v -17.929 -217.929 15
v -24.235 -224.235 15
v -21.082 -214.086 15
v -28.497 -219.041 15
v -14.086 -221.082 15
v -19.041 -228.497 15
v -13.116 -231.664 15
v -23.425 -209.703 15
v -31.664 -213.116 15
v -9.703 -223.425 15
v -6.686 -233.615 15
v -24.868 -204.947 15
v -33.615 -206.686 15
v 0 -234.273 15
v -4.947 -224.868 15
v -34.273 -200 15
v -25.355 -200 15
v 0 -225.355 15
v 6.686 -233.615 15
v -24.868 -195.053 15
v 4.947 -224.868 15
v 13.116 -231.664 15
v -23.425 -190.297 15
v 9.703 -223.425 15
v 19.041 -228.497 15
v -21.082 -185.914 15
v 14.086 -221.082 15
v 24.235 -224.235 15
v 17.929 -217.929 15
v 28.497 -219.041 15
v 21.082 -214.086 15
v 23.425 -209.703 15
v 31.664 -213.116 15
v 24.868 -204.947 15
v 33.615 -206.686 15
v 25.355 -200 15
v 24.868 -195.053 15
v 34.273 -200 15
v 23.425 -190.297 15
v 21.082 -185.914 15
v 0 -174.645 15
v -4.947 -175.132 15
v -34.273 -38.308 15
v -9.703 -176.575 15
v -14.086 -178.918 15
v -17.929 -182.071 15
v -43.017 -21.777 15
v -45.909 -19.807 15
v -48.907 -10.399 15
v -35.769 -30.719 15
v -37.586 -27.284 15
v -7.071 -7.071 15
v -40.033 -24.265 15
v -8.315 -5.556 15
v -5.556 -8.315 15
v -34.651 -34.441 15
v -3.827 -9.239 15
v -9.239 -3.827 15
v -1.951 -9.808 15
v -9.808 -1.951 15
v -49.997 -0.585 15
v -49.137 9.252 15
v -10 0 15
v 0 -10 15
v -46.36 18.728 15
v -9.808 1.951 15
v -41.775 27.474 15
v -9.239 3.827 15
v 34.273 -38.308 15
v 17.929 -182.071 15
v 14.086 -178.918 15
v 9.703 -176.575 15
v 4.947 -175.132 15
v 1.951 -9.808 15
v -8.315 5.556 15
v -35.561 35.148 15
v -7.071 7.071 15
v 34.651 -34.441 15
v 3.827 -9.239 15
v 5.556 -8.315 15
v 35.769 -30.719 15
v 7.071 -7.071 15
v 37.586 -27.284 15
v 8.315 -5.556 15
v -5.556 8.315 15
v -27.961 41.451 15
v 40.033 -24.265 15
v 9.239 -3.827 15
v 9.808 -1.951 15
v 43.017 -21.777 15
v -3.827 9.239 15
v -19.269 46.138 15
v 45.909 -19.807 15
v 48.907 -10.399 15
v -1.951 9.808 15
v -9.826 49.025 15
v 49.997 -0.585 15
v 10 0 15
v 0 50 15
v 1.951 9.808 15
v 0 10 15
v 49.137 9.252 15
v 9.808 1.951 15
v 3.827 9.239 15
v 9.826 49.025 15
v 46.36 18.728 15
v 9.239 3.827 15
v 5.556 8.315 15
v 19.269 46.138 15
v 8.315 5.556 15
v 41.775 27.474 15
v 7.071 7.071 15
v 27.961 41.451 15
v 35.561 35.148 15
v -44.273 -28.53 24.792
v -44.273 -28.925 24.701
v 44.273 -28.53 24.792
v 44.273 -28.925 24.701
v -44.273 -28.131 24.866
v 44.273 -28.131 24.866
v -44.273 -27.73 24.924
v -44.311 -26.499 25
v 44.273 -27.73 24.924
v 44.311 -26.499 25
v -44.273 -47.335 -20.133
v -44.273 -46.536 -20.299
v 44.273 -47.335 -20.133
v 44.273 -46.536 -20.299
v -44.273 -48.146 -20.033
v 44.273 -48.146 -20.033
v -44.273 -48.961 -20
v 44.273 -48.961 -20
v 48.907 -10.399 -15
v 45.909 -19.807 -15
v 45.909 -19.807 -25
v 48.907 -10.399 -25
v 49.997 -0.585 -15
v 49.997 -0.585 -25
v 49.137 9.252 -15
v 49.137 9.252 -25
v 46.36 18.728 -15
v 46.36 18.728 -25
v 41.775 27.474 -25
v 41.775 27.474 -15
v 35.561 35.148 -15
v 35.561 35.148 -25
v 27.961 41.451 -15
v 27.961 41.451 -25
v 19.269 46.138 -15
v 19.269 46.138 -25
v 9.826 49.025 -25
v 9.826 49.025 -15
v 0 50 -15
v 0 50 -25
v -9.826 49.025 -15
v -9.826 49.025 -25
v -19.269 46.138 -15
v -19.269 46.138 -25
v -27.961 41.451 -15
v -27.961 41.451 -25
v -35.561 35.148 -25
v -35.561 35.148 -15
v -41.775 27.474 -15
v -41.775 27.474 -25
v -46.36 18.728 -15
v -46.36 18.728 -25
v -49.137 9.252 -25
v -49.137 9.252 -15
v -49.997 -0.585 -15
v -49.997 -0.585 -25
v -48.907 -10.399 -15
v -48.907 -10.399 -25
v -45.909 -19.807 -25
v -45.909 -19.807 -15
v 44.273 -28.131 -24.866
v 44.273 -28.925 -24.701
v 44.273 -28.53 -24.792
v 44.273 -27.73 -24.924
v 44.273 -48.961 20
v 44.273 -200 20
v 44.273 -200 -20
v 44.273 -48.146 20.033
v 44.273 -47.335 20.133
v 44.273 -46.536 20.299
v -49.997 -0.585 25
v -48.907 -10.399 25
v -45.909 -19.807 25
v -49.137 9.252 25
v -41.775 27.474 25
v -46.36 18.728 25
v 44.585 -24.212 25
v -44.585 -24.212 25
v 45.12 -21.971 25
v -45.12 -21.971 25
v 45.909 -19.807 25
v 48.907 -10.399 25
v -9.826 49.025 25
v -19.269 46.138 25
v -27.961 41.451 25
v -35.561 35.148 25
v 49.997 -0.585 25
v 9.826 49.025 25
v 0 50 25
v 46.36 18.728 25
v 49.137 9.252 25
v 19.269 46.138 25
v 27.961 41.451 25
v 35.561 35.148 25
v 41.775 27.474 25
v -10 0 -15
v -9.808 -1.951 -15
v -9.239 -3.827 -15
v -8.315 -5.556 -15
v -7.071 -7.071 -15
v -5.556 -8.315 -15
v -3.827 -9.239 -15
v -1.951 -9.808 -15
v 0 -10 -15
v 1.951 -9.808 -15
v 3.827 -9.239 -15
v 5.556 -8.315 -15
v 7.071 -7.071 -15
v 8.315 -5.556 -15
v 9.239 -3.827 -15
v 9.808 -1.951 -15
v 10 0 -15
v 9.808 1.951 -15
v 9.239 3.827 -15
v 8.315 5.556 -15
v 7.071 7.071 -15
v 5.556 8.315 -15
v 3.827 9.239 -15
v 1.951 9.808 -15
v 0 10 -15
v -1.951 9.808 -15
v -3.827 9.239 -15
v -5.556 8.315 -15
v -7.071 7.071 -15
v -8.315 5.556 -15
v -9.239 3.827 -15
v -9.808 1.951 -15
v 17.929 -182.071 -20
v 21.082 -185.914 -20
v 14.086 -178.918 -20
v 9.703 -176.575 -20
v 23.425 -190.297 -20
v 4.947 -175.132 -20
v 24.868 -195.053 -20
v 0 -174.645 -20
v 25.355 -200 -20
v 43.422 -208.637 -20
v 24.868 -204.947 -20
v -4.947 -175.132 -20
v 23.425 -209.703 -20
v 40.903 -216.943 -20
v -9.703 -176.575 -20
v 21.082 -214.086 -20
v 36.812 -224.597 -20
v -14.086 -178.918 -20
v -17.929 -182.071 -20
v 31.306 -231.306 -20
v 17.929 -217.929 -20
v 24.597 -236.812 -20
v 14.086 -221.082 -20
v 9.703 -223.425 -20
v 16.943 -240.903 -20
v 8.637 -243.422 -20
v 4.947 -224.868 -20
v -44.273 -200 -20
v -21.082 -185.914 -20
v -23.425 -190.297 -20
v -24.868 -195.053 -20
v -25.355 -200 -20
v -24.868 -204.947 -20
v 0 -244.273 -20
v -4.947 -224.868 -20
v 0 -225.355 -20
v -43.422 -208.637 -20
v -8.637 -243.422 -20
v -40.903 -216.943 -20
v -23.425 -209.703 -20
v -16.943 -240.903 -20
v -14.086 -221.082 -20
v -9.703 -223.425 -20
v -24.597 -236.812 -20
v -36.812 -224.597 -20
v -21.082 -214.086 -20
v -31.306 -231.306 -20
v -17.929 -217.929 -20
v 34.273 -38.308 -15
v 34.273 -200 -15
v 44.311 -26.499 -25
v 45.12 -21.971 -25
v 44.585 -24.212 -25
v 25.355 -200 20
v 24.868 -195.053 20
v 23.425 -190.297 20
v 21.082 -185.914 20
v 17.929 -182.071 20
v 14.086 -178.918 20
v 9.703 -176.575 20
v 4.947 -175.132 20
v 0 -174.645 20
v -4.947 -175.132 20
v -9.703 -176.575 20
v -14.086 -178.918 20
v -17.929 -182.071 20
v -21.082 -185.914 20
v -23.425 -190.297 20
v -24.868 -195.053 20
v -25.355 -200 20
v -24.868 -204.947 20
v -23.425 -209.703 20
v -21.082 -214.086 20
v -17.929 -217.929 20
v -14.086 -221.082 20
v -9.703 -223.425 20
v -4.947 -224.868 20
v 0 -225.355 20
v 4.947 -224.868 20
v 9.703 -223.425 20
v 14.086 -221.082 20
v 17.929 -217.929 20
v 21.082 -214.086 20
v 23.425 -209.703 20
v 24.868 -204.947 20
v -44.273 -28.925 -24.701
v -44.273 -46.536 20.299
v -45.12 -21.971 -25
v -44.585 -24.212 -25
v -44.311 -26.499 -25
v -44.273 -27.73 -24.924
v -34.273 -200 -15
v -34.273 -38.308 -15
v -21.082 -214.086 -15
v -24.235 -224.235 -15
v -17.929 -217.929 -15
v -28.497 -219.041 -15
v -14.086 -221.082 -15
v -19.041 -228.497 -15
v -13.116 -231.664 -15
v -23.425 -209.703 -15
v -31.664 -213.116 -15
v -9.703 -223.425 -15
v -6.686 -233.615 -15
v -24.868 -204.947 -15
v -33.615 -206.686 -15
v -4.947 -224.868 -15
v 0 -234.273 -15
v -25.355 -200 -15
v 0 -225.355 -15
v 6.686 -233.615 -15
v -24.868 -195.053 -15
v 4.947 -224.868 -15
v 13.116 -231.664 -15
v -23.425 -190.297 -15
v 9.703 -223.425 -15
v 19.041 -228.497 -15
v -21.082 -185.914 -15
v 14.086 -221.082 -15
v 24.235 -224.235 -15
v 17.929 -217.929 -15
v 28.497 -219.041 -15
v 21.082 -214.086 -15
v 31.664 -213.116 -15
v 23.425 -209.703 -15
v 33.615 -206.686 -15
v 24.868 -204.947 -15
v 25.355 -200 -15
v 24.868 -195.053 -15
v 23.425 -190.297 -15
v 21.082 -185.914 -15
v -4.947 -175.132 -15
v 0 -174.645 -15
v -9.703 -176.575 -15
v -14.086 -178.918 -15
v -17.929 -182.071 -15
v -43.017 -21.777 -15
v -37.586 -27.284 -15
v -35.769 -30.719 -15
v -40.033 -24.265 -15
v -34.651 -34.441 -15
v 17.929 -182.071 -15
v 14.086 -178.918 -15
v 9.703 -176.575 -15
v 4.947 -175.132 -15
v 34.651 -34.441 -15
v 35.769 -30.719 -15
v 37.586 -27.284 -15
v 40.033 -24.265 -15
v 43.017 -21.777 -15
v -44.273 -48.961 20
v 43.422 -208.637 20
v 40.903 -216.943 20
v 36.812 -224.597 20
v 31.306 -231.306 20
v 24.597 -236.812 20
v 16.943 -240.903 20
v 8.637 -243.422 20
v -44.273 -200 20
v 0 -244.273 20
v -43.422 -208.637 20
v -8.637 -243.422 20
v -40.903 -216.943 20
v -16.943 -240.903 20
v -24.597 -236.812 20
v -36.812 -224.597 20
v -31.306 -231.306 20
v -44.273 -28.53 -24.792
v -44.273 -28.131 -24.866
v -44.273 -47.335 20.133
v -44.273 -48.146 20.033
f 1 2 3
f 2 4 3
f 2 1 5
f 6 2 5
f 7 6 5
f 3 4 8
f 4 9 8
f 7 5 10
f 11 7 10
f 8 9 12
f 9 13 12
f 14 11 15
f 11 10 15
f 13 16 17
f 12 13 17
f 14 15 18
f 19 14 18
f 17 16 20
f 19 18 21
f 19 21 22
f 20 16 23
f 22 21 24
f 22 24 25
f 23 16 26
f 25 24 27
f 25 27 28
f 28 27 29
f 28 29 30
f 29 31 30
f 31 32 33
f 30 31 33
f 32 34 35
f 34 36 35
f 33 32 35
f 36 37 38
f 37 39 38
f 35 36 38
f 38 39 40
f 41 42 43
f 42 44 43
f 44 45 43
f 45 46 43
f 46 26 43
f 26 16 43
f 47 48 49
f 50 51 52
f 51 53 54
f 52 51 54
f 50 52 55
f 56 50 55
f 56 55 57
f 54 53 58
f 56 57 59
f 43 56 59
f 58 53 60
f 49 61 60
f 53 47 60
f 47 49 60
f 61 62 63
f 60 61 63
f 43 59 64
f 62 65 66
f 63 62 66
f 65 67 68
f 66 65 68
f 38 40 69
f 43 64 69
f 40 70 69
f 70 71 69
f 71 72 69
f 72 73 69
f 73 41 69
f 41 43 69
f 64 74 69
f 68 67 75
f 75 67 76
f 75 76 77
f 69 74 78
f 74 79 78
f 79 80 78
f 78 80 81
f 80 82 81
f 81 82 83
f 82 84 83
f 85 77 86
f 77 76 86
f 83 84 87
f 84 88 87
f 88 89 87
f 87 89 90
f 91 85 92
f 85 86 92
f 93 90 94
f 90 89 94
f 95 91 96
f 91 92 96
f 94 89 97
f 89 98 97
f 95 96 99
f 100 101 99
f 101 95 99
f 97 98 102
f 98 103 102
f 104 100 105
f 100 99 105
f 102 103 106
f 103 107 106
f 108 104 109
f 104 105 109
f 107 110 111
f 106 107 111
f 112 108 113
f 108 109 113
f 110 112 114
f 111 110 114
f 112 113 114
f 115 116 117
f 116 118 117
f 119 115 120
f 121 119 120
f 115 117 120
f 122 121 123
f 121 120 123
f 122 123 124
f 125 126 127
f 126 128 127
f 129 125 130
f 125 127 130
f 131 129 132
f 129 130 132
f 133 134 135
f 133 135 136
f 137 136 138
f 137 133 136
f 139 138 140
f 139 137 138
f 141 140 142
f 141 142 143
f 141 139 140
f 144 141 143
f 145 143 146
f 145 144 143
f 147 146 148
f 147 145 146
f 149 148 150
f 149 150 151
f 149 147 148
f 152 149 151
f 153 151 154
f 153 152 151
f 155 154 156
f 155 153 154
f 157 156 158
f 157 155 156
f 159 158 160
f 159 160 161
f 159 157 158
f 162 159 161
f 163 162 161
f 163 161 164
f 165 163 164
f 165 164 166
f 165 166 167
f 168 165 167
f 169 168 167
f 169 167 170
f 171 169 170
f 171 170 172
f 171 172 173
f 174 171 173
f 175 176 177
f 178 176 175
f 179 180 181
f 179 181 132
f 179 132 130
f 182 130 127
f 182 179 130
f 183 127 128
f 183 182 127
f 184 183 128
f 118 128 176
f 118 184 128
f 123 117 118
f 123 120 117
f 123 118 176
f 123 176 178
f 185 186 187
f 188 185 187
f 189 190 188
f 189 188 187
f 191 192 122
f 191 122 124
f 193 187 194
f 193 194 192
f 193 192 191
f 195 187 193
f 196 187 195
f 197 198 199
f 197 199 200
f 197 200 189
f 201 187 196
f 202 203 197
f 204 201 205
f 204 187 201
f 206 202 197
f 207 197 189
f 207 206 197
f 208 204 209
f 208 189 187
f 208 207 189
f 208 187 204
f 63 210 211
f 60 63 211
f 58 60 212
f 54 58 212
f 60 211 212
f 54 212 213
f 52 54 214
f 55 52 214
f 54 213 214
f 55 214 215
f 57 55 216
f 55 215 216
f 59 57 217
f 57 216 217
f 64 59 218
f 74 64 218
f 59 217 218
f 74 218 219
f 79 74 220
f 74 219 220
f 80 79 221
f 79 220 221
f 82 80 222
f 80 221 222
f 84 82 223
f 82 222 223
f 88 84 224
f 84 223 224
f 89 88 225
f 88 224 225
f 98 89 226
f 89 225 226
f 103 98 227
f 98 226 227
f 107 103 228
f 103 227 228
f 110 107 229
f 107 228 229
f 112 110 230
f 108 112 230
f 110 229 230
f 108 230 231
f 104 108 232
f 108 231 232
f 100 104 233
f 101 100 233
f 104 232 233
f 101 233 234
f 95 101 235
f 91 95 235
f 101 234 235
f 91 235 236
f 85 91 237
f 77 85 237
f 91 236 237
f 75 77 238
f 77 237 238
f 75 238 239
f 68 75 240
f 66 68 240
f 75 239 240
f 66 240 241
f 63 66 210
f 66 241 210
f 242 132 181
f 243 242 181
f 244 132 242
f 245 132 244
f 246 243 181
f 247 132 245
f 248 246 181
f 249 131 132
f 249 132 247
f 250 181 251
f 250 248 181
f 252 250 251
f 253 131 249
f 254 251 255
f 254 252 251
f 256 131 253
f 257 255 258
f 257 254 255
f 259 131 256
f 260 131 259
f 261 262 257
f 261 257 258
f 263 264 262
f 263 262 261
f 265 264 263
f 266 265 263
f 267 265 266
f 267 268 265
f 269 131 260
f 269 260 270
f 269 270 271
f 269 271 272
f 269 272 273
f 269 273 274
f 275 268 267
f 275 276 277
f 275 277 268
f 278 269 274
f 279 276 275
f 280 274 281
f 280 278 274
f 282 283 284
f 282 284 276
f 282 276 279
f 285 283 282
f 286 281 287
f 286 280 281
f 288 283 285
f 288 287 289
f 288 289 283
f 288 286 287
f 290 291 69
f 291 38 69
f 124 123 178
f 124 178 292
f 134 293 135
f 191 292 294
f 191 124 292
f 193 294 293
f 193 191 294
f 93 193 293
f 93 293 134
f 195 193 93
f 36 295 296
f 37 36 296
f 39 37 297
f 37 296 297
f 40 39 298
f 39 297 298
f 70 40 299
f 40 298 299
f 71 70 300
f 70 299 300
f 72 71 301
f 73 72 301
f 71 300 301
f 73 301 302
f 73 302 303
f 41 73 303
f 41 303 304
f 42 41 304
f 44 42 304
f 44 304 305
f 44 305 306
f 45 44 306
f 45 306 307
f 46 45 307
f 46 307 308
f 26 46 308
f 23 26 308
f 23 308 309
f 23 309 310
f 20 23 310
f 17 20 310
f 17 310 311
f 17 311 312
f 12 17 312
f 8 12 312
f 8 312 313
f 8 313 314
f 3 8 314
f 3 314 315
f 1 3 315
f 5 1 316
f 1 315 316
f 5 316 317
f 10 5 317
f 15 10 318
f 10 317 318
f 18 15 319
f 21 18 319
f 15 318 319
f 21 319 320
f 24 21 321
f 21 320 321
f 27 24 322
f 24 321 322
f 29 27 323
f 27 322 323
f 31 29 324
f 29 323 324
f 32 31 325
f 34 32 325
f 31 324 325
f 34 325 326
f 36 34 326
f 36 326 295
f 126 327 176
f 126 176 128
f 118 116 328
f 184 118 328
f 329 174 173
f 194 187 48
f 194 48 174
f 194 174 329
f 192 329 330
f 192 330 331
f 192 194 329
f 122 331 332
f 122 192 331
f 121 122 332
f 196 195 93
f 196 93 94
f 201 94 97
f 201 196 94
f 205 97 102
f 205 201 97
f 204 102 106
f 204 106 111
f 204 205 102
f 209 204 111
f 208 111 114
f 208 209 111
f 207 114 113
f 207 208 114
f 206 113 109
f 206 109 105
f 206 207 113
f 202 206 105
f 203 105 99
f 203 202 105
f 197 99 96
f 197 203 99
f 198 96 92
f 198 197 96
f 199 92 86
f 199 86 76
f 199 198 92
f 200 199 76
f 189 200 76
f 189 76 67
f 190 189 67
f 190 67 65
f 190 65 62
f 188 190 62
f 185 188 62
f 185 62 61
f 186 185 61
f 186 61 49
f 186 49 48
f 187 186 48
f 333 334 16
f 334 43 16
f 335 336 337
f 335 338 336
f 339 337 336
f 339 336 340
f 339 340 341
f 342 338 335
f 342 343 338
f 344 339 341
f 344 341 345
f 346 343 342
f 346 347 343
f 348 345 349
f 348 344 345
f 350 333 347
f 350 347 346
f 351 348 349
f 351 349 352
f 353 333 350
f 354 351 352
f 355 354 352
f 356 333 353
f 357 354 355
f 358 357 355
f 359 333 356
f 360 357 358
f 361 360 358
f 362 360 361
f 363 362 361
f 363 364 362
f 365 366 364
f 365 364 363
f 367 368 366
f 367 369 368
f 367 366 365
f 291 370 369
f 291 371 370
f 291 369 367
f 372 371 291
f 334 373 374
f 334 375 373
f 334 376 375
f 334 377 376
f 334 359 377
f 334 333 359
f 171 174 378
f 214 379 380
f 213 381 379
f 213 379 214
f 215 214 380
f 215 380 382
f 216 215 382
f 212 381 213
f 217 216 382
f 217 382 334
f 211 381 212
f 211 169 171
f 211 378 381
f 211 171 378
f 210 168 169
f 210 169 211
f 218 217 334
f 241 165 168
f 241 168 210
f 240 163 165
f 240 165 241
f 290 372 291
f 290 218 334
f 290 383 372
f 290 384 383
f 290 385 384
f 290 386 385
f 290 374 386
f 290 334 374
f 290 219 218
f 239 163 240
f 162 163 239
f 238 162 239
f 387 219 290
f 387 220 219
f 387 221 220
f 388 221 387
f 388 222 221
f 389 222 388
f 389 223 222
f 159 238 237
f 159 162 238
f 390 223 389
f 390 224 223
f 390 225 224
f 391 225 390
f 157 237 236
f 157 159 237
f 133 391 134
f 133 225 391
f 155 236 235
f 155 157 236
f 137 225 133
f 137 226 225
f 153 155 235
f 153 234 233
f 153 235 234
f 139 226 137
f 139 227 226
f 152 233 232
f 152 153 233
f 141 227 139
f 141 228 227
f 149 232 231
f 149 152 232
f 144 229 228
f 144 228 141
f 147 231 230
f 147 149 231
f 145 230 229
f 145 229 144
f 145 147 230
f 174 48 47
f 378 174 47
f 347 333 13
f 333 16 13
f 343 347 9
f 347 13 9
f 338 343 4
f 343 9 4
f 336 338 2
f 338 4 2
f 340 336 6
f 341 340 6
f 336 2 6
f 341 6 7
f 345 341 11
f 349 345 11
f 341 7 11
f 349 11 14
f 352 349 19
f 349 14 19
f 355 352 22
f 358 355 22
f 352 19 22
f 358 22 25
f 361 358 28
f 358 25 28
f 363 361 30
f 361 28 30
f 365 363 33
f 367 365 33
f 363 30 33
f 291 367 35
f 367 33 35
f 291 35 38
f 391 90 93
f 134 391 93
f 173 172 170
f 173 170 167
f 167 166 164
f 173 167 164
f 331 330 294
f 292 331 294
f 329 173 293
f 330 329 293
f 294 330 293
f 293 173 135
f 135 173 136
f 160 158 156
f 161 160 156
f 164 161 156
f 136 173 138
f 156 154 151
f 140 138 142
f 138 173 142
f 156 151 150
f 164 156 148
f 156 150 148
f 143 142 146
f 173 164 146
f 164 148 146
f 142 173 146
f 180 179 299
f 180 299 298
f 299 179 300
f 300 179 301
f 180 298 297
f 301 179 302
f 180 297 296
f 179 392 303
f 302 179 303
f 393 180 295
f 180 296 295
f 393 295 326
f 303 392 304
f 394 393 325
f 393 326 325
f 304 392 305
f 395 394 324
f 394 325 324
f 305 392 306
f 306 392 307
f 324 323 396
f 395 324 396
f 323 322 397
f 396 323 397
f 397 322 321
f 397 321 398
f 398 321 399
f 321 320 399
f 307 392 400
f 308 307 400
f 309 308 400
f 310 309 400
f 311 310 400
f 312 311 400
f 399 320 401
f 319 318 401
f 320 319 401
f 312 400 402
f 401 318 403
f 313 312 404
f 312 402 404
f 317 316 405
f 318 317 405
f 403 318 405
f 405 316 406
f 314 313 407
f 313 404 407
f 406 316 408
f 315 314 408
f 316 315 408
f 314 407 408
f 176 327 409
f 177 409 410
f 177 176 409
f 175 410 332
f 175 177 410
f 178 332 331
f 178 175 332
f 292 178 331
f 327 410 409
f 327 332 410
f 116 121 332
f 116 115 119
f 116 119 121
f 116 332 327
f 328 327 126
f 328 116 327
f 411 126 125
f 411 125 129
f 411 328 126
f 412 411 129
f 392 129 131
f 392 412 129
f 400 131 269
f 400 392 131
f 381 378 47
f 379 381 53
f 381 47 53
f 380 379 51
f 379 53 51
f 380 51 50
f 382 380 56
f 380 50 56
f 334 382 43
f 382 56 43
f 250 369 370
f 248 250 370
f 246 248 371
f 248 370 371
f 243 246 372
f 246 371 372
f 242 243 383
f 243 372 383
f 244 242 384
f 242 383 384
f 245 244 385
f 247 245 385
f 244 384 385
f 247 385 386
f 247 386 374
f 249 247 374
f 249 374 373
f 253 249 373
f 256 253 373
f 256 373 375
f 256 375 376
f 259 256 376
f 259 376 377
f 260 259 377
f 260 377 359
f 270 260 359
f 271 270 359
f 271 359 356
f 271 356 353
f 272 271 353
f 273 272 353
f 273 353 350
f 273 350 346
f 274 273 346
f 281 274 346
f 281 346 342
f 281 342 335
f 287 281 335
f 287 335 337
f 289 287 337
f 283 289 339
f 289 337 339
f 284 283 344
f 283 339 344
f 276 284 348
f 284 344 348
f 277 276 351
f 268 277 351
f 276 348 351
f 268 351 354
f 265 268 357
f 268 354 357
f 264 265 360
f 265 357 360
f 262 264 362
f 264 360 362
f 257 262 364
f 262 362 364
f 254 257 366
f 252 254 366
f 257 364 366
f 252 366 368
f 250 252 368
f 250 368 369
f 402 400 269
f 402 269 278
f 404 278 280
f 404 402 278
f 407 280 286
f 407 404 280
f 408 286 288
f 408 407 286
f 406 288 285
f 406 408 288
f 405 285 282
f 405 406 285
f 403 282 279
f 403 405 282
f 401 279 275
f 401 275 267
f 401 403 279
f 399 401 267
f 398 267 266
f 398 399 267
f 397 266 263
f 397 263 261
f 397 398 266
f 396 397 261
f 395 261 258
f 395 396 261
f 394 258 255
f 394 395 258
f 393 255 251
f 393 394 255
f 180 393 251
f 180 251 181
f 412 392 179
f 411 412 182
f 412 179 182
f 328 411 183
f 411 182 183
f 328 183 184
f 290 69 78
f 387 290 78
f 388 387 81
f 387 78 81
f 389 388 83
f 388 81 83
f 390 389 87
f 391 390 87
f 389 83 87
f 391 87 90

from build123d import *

# Parameters (mm, degrees)
BOSS_EXTRU_1_DEPTH      = 25
ENL_V_MAT_EXTRU_1_DEPTH = 15
ESQUISSE4_R             = 25.355
ENL_V_MAT_EXTRU_2_DEPTH = 255.301687519
ESQUISSE5_R             = 10
BOSS_EXTRU_2_DEPTH      = 30
ENL_V_MAT_EXTRU_3_DEPTH = 264.024268847
CONG_1_R                = 10


with BuildPart() as part:
    # Esquisse1 → Boss.-Extru.1 (new, symmetric)
    with BuildSketch(Plane.XY):
        with BuildLine():
            Line((44.273101825, -200), (44.273101825, -27.730279152))
            ThreePointArc((44.273101825, -27.730279152), (44.686437132, -23.685212253), (45.909358446, -19.807342251))
            ThreePointArc((45.909358446, -19.807342251), (0, 50), (-45.909358446, -19.807342251))
            ThreePointArc((-45.909358446, -19.807342251), (-44.686437132, -23.685212253), (-44.273101825, -27.730279152))
            Line((-44.273101825, -27.730279152), (-44.273101825, -200))
            ThreePointArc((-44.273101825, -200), (0, -244.273101825), (44.273101825, -200))
        make_face()
    extrude(amount=BOSS_EXTRU_1_DEPTH, both=True)

    # Esquisse3 → Enlèv. mat.-Extru.1 (cut, symmetric)
    with BuildSketch(Plane.XY):
        with BuildLine():
            Line((34.273101825, -200), (34.273101825, -38.308494588))
            ThreePointArc((34.273101825, -38.308494588), (36.593682253, -28.957659138), (43.016914187, -21.776760261))
            Line((43.016914187, -21.776760261), (45.909358446, -19.807342251))
            ThreePointArc((45.909358446, -19.807342251), (0, 50), (-45.909358446, -19.807342251))
            Line((-45.909358446, -19.807342251), (-43.016914187, -21.776760261))
            ThreePointArc((-43.016914187, -21.776760261), (-36.593682253, -28.957659138), (-34.273101825, -38.308494588))
            Line((-34.273101825, -38.308494588), (-34.273101825, -200))
            ThreePointArc((-34.273101825, -200), (0, -234.273101825), (34.273101825, -200))
        make_face()
    extrude(amount=ENL_V_MAT_EXTRU_1_DEPTH, both=True, mode=Mode.SUBTRACT)

    # Esquisse4 → Enlèv. mat.-Extru.2 (cut, through all)
    with BuildSketch(Plane.XY.offset(25)):
        with Locations((0, -200)):
            Circle(ESQUISSE4_R)
    extrude(amount=-ENL_V_MAT_EXTRU_2_DEPTH, mode=Mode.SUBTRACT)

    # Esquisse5 → Boss.-Extru.2 (add)
    with BuildSketch(Plane.XY.offset(-15)):
        with Locations(Location((0, 0, 0), (0, 0, 180))):
            Circle(ESQUISSE5_R)
    extrude(amount=BOSS_EXTRU_2_DEPTH)

    # Esquisse6 → Enlèv. mat.-Extru.3 (cut, through all)
    with BuildSketch(Plane.ZY.offset(44.273101825)):
        Polygon((-25, -27.730279152), (-20, -47.730279152), (-20, -248.850889137), (-25, -248.850889137), align=None)
        Polygon((20, -248.850889137), (25, -248.850889137), (25, -27.730279152), (20, -47.730279152), align=None)
    extrude(amount=-ENL_V_MAT_EXTRU_3_DEPTH, mode=Mode.SUBTRACT)

    # Congé1
    cong_1_edges = [part.edges().sort_by_distance(p)[0] for p in [
        (0, -27.730279152, -25),
        (0, -47.730279152, -20),
        (0, -47.730279152, 20),
        (0, -27.730279152, 25),
    ]]
    fillet(cong_1_edges, radius=CONG_1_R)


solid = part.part
